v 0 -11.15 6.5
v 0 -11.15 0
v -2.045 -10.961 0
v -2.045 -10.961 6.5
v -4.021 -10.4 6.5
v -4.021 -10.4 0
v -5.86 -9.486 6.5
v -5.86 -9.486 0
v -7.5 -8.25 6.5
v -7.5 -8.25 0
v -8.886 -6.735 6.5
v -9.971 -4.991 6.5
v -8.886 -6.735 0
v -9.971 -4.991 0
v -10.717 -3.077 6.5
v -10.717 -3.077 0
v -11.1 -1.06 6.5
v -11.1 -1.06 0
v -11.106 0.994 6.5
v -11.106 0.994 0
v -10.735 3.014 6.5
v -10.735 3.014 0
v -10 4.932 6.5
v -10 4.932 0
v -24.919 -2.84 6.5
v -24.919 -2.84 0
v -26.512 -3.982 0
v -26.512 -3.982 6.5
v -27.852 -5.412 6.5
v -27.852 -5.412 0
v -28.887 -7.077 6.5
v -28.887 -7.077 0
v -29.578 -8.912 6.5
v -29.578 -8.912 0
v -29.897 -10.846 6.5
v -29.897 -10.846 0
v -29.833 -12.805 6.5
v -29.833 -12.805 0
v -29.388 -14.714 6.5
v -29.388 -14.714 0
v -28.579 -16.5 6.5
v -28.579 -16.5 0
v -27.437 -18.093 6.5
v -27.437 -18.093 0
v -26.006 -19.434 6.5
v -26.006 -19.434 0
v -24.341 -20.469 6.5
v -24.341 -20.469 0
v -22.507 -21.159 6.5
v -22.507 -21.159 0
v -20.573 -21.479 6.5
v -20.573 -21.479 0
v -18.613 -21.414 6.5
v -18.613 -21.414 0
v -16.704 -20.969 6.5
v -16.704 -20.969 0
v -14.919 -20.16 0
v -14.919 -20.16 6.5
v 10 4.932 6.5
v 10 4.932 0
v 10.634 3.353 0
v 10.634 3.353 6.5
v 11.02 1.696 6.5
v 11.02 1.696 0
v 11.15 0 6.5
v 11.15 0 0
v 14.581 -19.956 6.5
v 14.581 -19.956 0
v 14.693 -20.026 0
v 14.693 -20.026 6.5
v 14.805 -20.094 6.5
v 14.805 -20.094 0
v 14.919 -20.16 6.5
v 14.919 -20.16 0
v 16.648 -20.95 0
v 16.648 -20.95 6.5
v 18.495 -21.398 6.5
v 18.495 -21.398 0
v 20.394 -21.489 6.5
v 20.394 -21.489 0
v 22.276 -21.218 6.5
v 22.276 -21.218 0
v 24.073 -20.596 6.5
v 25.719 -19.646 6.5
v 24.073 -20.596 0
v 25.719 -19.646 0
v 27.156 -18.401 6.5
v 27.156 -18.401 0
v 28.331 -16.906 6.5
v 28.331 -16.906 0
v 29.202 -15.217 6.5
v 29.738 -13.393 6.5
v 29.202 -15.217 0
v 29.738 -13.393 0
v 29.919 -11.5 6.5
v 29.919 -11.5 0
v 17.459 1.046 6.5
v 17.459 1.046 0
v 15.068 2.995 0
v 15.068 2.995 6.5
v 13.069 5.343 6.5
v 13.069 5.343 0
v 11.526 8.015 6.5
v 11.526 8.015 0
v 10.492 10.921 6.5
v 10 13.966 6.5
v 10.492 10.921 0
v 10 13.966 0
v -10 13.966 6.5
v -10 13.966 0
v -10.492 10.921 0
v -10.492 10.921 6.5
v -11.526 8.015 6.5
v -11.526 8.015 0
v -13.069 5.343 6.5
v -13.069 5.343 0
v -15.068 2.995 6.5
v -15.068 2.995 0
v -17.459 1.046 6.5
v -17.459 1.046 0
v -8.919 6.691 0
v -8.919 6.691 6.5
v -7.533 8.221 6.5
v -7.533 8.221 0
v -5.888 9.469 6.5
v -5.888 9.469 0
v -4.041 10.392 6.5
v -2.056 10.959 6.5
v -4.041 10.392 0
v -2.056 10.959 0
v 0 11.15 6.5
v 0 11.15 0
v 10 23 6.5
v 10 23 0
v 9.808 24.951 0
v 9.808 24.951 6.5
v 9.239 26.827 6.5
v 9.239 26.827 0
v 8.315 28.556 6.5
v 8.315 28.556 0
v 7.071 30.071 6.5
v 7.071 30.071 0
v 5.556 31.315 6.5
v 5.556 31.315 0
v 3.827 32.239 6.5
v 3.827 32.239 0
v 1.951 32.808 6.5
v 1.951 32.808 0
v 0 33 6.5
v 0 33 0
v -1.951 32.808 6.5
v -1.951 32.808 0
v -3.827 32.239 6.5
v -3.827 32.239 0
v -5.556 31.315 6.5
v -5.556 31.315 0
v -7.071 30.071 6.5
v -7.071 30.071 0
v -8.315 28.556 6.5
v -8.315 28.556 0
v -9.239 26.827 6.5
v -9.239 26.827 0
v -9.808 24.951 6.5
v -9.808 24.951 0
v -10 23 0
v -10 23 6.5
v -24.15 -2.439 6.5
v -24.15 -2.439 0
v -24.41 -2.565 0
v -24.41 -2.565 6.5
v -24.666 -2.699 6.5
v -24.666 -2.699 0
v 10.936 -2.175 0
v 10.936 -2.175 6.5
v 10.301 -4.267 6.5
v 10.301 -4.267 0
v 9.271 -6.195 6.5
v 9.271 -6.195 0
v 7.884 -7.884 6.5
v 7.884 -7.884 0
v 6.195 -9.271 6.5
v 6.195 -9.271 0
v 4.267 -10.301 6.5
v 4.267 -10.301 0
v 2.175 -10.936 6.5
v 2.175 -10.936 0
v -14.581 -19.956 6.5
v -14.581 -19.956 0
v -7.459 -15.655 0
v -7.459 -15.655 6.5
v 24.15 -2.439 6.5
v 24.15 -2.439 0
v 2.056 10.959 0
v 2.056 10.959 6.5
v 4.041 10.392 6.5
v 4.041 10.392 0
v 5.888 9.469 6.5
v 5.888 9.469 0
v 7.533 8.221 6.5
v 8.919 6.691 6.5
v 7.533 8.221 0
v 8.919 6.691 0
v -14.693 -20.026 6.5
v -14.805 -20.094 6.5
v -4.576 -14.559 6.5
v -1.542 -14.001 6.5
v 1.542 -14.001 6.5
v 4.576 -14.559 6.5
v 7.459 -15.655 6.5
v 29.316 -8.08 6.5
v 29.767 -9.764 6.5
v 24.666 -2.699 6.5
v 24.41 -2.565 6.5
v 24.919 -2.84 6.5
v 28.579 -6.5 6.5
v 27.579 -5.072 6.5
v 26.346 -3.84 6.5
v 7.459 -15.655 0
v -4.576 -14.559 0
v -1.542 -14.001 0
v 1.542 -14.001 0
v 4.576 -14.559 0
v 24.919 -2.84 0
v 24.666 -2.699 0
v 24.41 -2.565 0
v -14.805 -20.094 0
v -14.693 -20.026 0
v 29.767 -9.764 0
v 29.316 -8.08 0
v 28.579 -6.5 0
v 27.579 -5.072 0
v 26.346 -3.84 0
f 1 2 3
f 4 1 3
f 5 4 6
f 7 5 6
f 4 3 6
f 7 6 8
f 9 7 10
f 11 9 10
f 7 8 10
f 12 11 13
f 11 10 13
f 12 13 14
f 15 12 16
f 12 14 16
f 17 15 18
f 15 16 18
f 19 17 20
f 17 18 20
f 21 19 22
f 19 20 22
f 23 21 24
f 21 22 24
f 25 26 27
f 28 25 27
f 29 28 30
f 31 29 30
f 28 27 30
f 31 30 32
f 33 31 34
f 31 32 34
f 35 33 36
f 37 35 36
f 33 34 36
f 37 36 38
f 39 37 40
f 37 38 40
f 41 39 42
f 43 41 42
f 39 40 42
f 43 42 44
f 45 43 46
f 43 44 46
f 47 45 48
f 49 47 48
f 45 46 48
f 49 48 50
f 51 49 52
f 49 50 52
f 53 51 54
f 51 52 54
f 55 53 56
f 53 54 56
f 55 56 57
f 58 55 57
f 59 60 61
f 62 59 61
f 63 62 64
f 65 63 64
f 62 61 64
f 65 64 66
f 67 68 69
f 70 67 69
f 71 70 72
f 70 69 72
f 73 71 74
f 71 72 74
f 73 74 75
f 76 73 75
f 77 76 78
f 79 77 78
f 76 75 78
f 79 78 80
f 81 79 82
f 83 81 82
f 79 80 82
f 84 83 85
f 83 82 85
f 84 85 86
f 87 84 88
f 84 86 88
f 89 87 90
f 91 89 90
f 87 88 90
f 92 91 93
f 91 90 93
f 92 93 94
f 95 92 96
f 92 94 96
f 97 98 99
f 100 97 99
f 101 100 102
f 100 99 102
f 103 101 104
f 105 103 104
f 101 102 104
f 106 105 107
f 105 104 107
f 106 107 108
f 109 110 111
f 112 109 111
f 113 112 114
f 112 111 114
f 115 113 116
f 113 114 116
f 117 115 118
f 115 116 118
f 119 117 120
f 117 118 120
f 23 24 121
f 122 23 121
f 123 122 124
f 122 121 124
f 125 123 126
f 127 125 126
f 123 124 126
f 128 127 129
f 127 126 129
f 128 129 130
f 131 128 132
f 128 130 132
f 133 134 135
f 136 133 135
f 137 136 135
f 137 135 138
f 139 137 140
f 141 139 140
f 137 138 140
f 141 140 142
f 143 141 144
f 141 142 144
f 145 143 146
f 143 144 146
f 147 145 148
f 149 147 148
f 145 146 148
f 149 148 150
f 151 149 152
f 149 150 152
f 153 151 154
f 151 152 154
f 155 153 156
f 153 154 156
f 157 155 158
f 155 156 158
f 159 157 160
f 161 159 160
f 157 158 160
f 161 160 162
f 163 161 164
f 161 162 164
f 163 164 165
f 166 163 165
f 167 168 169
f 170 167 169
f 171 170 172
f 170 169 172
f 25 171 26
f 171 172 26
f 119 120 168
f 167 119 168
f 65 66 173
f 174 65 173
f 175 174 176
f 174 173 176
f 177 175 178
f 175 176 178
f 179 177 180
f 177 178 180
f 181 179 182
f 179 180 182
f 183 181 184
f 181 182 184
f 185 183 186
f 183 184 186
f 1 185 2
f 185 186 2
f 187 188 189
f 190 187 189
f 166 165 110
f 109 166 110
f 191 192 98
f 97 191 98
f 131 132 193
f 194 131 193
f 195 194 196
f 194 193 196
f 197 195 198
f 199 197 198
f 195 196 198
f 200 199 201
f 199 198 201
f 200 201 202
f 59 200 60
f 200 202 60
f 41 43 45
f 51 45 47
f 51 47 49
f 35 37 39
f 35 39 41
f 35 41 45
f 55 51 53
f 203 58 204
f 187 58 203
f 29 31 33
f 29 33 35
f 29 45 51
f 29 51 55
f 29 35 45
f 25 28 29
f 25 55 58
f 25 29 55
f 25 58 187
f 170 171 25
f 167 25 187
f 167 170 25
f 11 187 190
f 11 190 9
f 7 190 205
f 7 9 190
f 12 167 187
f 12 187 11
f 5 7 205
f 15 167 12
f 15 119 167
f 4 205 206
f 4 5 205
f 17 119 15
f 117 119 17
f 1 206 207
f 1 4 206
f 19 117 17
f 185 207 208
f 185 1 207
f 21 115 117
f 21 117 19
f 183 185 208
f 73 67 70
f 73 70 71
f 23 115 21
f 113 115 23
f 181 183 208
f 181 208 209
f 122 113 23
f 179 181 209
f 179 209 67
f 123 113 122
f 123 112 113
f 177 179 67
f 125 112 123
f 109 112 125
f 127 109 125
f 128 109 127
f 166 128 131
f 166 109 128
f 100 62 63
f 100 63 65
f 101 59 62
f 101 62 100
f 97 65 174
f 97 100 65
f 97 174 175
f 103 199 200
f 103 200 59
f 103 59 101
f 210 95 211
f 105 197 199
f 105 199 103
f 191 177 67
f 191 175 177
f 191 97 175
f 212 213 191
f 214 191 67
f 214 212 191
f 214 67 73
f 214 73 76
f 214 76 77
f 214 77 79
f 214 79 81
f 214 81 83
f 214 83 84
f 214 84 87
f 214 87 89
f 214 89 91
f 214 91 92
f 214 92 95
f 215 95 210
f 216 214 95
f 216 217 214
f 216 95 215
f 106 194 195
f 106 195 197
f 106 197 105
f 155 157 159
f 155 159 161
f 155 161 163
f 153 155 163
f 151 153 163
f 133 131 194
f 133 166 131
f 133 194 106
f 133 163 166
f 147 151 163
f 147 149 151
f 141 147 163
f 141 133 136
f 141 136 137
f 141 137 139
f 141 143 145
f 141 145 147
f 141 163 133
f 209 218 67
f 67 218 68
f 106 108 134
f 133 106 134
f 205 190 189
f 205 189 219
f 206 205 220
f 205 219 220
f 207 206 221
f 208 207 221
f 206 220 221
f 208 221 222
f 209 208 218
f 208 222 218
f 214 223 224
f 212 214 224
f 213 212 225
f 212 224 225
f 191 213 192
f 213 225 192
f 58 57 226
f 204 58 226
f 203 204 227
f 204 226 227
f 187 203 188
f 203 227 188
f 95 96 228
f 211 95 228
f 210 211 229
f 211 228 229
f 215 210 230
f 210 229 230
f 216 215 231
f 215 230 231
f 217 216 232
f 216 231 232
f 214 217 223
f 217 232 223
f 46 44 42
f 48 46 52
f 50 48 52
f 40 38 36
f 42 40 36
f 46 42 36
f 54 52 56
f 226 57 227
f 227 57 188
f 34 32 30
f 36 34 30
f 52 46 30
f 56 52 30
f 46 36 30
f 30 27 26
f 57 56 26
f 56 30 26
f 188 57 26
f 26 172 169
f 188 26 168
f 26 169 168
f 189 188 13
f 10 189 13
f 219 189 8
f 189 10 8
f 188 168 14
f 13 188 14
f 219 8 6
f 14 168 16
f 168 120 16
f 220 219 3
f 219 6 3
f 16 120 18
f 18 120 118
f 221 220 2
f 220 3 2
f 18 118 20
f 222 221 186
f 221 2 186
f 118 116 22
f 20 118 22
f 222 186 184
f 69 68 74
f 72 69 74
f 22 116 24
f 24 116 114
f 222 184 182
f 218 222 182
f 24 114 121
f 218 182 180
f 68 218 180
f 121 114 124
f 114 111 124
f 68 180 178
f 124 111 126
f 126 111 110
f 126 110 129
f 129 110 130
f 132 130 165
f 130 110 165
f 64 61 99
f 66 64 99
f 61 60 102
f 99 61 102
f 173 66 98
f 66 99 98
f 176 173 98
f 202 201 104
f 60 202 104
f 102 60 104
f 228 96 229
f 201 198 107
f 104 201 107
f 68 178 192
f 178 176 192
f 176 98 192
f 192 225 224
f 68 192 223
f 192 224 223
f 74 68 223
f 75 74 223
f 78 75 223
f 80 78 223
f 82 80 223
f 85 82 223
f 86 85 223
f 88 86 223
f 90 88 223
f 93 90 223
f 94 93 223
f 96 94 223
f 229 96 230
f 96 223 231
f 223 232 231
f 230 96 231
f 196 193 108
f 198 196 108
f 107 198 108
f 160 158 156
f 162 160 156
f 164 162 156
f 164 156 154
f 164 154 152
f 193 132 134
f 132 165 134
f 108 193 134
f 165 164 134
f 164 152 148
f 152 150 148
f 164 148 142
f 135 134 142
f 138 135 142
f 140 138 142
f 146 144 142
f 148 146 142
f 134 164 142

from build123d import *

# Parameters (mm, degrees)
F1_DEPTH = 6.5


# Not quite as in the source:
# - a feature names something its author has since deleted; it is built from what else it names


with BuildPart() as f1:
    # F0 (on Top) → F1 (new body)
    with BuildSketch(Plane.XY):
        with BuildLine():
            Line((10, 13.9658923334), (10, 5.6794919243))
            Line((10, 5.6794919243), (10.6173677664, 4.610179586))
            Line((10.6173677664, 4.610179586), (17.4592921435, 1.0460193523))
            ThreePointArc((17.4592921435, 1.0460193523), (12.2366972109, 6.6440014162), (10, 13.9658923334))
        make_face()
        with BuildLine():
            Line((5, 14.3397459622), (10, 5.6794919243))
            Line((10, 5.6794919243), (10, 13.9658923334))
            Line((10, 13.9658923334), (10, 23))
            ThreePointArc((10, 23), (8.6602540378, 18), (5, 14.3397459622))
        make_face()
        with BuildLine():
            Line((17.4592921435, 1.0460193523), (10.6173677664, 4.610179586))
            Line((10.6173677664, 4.610179586), (14.918584287, -2.8397459622))
            ThreePointArc((14.918584287, -2.8397459622), (19.4852389907, -1.5093938195), (24.1499344795, -2.4393336035))
            Line((24.1499344795, -2.4393336035), (17.4592921435, 1.0460193523))
        make_face()
        with BuildLine():
            Line((-7.4592921435, -15.6551270189), (-0.5795069127, -11.5))
            Line((-0.5795069127, -11.5), (-9.918584287, -11.5))
            ThreePointArc((-9.918584287, -11.5), (-11.1613785992, -16.328182737), (-14.5808539954, -19.9562778652))
            Line((-14.5808539954, -19.9562778652), (-7.4592921435, -15.6551270189))
        make_face()
        with BuildLine():
            Line((0.5795069127, -11.5), (-0.5795069127, -11.5))
            Line((-0.5795069127, -11.5), (-7.4592921435, -15.6551270189))
            ThreePointArc((-7.4592921435, -15.6551270189), (0, -13.9312181655), (7.4592921435, -15.6551270189))
            Line((7.4592921435, -15.6551270189), (0.5795069127, -11.5))
        make_face()
        with BuildLine():
            Line((9.918584287, -11.5), (0.5795069127, -11.5))
            Line((0.5795069127, -11.5), (7.4592921435, -15.6551270189))
            Line((7.4592921435, -15.6551270189), (14.5808539954, -19.9562778652))
            ThreePointArc((14.5808539954, -19.9562778652), (11.1613785992, -16.328182737), (9.918584287, -11.5))
        make_face()
        with BuildLine():
            Line((0, 23), (5, 14.3397459622))
            ThreePointArc((5, 14.3397459622), (8.6602540378, 18), (10, 23))
            Line((10, 23), (0, 23))
        make_face()
        with BuildLine():
            ThreePointArc((24.1499344795, -2.4393336035), (19.4852389907, -1.5093938195), (14.918584287, -2.8397459622))
            Line((14.918584287, -2.8397459622), (19.918584287, -11.5))
            Line((19.918584287, -11.5), (24.918584287, -2.8397459622))
            Line((24.918584287, -2.8397459622), (24.1499344795, -2.4393336035))
        make_face()
        with BuildLine():
            Line((-10, 13.9658923334), (-10, 5.6794919243))
            Line((-10, 5.6794919243), (-5, 14.3397459622))
            ThreePointArc((-5, 14.3397459622), (-8.6602540378, 18), (-10, 23))
            Line((-10, 23), (-10, 13.9658923334))
        make_face()
        with BuildLine():
            Line((-10.6173677664, 4.610179586), (-10, 5.6794919243))
            Line((-10, 5.6794919243), (-10, 13.9658923334))
            ThreePointArc((-10, 13.9658923334), (-12.2366972109, 6.6440014162), (-17.4592921435, 1.0460193523))
            Line((-17.4592921435, 1.0460193523), (-10.6173677664, 4.610179586))
        make_face()
        with BuildLine():
            Line((-14.918584287, -2.8397459622), (-10.6173677664, 4.610179586))
            Line((-10.6173677664, 4.610179586), (-17.4592921435, 1.0460193523))
            Line((-17.4592921435, 1.0460193523), (-24.1499344795, -2.4393336035))
            ThreePointArc((-24.1499344795, -2.4393336035), (-19.4852389907, -1.5093938195), (-14.918584287, -2.8397459622))
        make_face()
        with BuildLine():
            ThreePointArc((-14.5808539954, -19.9562778652), (-11.1613785992, -16.328182737), (-9.918584287, -11.5))
            Line((-9.918584287, -11.5), (-19.918584287, -11.5))
            Line((-19.918584287, -11.5), (-14.918584287, -20.1602540378))
            Line((-14.918584287, -20.1602540378), (-14.5808539954, -19.9562778652))
        make_face()
        with BuildLine():
            Line((19.918584287, -11.5), (9.918584287, -11.5))
            ThreePointArc((9.918584287, -11.5), (11.1613785992, -16.328182737), (14.5808539954, -19.9562778652))
            Line((14.5808539954, -19.9562778652), (14.918584287, -20.1602540378))
            Line((14.918584287, -20.1602540378), (19.918584287, -11.5))
        make_face()
        with BuildLine():
            Line((-5, 14.3397459622), (0, 23))
            Line((0, 23), (-10, 23))
            ThreePointArc((-10, 23), (-8.6602540378, 18), (-5, 14.3397459622))
        make_face()
        with BuildLine():
            Line((-10, 23), (0, 23))
            Line((0, 23), (10, 23))
            ThreePointArc((10, 23), (0, 33), (-10, 23))
        make_face()
        with BuildLine():
            Line((24.918584287, -2.8397459622), (19.918584287, -11.5))
            Line((19.918584287, -11.5), (14.918584287, -20.1602540378))
            ThreePointArc((14.918584287, -20.1602540378), (24.918584287, -20.1602540378), (29.918584287, -11.5))
            ThreePointArc((29.918584287, -11.5), (28.5788383249, -6.5), (24.918584287, -2.8397459622))
        make_face()
        with BuildLine():
            ThreePointArc((24.918584287, -2.8397459622), (24.538599342, -2.6312086003), (24.1499344795, -2.4393336035))
            Line((24.1499344795, -2.4393336035), (24.918584287, -2.8397459622))
        make_face()
        with BuildLine():
            Line((-19.918584287, -11.5), (-14.918584287, -2.8397459622))
            ThreePointArc((-14.918584287, -2.8397459622), (-19.4852389907, -1.5093938195), (-24.1499344795, -2.4393336035))
            Line((-24.1499344795, -2.4393336035), (-24.918584287, -2.8397459622))
            Line((-24.918584287, -2.8397459622), (-19.918584287, -11.5))
        make_face()
        with BuildLine():
            Line((-14.918584287, -20.1602540378), (-19.918584287, -11.5))
            Line((-19.918584287, -11.5), (-24.918584287, -2.8397459622))
            ThreePointArc((-24.918584287, -2.8397459622), (-28.5788383249, -16.5), (-14.918584287, -20.1602540378))
        make_face()
        with BuildLine():
            ThreePointArc((-14.918584287, -20.1602540378), (-14.7487130637, -20.0599317482), (-14.5808539954, -19.9562778652))
            Line((-14.5808539954, -19.9562778652), (-14.918584287, -20.1602540378))
        make_face()
        with BuildLine():
            Line((14.918584287, -20.1602540378), (14.5808539954, -19.9562778652))
            ThreePointArc((14.5808539954, -19.9562778652), (14.7487130637, -20.0599317482), (14.918584287, -20.1602540378))
        make_face()
        with BuildLine():
            Line((-24.918584287, -2.8397459622), (-24.1499344795, -2.4393336035))
            ThreePointArc((-24.1499344795, -2.4393336035), (-24.538599342, -2.6312086003), (-24.918584287, -2.8397459622))
        make_face()
        with BuildLine():
            Line((-0.5795069127, -11.5), (0, -11.15))
            ThreePointArc((0, -11.15), (-9.468682565, -5.8878307111), (-10, 4.9317846668))
            Line((-10, 4.9317846668), (-10.6173677664, 4.610179586))
            Line((-10.6173677664, 4.610179586), (-14.918584287, -2.8397459622))
            ThreePointArc((-14.918584287, -2.8397459622), (-11.2583302492, -6.5), (-9.918584287, -11.5))
            Line((-9.918584287, -11.5), (-0.5795069127, -11.5))
        make_face()
        with BuildLine():
            Line((-19.918584287, -11.5), (-9.918584287, -11.5))
            ThreePointArc((-9.918584287, -11.5), (-11.2583302492, -6.5), (-14.918584287, -2.8397459622))
            Line((-14.918584287, -2.8397459622), (-19.918584287, -11.5))
        make_face()
        Polygon((-10.6173677664, 4.610179586), (-10, 4.9317846668), (-10, 5.6794919243), align=None)
        with BuildLine():
            ThreePointArc((-10, 4.9317846668), (-5.8878307111, 9.468682565), (0, 11.15))
            Line((0, 11.15), (0, 13))
            ThreePointArc((0, 13), (-2.588190451, 13.3407417371), (-5, 14.3397459622))
            Line((-5, 14.3397459622), (-10, 5.6794919243))
            Line((-10, 5.6794919243), (-10, 4.9317846668))
        make_face()
        with BuildLine():
            ThreePointArc((-5, 14.3397459622), (-2.588190451, 13.3407417371), (0, 13))
            Line((0, 13), (0, 23))
            Line((0, 23), (-5, 14.3397459622))
        make_face()
        with BuildLine():
            Line((0, 23), (0, 13))
            ThreePointArc((0, 13), (2.588190451, 13.3407417371), (5, 14.3397459622))
            Line((5, 14.3397459622), (0, 23))
        make_face()
        with BuildLine():
            ThreePointArc((0, 11.15), (5.8878307111, 9.468682565), (10, 4.9317846668))
            Line((10, 4.9317846668), (10, 5.6794919243))
            Line((10, 5.6794919243), (5, 14.3397459622))
            ThreePointArc((5, 14.3397459622), (2.588190451, 13.3407417371), (0, 13))
            Line((0, 13), (0, 11.15))
        make_face()
        Polygon((10, 5.6794919243), (10, 4.9317846668), (10.6173677664, 4.610179586), align=None)
        with BuildLine():
            ThreePointArc((10, 4.9317846668), (10.8586946729, 2.5320446284), (11.15, 0))
            ThreePointArc((11.15, 0), (7.8842406102, -7.8842406102), (0, -11.15))
            Line((0, -11.15), (0.5795069127, -11.5))
            Line((0.5795069127, -11.5), (9.918584287, -11.5))
            ThreePointArc((9.918584287, -11.5), (11.2583302492, -6.5), (14.918584287, -2.8397459622))
            Line((14.918584287, -2.8397459622), (10.6173677664, 4.610179586))
            Line((10.6173677664, 4.610179586), (10, 4.9317846668))
        make_face()
        with BuildLine():
            Line((19.918584287, -11.5), (14.918584287, -2.8397459622))
            ThreePointArc((14.918584287, -2.8397459622), (11.2583302492, -6.5), (9.918584287, -11.5))
            Line((9.918584287, -11.5), (19.918584287, -11.5))
        make_face()
        Polygon((0.5795069127, -11.5), (0, -11.15), (-0.5795069127, -11.5), align=None)
    extrude(amount=F1_DEPTH)


solid = f1.part
